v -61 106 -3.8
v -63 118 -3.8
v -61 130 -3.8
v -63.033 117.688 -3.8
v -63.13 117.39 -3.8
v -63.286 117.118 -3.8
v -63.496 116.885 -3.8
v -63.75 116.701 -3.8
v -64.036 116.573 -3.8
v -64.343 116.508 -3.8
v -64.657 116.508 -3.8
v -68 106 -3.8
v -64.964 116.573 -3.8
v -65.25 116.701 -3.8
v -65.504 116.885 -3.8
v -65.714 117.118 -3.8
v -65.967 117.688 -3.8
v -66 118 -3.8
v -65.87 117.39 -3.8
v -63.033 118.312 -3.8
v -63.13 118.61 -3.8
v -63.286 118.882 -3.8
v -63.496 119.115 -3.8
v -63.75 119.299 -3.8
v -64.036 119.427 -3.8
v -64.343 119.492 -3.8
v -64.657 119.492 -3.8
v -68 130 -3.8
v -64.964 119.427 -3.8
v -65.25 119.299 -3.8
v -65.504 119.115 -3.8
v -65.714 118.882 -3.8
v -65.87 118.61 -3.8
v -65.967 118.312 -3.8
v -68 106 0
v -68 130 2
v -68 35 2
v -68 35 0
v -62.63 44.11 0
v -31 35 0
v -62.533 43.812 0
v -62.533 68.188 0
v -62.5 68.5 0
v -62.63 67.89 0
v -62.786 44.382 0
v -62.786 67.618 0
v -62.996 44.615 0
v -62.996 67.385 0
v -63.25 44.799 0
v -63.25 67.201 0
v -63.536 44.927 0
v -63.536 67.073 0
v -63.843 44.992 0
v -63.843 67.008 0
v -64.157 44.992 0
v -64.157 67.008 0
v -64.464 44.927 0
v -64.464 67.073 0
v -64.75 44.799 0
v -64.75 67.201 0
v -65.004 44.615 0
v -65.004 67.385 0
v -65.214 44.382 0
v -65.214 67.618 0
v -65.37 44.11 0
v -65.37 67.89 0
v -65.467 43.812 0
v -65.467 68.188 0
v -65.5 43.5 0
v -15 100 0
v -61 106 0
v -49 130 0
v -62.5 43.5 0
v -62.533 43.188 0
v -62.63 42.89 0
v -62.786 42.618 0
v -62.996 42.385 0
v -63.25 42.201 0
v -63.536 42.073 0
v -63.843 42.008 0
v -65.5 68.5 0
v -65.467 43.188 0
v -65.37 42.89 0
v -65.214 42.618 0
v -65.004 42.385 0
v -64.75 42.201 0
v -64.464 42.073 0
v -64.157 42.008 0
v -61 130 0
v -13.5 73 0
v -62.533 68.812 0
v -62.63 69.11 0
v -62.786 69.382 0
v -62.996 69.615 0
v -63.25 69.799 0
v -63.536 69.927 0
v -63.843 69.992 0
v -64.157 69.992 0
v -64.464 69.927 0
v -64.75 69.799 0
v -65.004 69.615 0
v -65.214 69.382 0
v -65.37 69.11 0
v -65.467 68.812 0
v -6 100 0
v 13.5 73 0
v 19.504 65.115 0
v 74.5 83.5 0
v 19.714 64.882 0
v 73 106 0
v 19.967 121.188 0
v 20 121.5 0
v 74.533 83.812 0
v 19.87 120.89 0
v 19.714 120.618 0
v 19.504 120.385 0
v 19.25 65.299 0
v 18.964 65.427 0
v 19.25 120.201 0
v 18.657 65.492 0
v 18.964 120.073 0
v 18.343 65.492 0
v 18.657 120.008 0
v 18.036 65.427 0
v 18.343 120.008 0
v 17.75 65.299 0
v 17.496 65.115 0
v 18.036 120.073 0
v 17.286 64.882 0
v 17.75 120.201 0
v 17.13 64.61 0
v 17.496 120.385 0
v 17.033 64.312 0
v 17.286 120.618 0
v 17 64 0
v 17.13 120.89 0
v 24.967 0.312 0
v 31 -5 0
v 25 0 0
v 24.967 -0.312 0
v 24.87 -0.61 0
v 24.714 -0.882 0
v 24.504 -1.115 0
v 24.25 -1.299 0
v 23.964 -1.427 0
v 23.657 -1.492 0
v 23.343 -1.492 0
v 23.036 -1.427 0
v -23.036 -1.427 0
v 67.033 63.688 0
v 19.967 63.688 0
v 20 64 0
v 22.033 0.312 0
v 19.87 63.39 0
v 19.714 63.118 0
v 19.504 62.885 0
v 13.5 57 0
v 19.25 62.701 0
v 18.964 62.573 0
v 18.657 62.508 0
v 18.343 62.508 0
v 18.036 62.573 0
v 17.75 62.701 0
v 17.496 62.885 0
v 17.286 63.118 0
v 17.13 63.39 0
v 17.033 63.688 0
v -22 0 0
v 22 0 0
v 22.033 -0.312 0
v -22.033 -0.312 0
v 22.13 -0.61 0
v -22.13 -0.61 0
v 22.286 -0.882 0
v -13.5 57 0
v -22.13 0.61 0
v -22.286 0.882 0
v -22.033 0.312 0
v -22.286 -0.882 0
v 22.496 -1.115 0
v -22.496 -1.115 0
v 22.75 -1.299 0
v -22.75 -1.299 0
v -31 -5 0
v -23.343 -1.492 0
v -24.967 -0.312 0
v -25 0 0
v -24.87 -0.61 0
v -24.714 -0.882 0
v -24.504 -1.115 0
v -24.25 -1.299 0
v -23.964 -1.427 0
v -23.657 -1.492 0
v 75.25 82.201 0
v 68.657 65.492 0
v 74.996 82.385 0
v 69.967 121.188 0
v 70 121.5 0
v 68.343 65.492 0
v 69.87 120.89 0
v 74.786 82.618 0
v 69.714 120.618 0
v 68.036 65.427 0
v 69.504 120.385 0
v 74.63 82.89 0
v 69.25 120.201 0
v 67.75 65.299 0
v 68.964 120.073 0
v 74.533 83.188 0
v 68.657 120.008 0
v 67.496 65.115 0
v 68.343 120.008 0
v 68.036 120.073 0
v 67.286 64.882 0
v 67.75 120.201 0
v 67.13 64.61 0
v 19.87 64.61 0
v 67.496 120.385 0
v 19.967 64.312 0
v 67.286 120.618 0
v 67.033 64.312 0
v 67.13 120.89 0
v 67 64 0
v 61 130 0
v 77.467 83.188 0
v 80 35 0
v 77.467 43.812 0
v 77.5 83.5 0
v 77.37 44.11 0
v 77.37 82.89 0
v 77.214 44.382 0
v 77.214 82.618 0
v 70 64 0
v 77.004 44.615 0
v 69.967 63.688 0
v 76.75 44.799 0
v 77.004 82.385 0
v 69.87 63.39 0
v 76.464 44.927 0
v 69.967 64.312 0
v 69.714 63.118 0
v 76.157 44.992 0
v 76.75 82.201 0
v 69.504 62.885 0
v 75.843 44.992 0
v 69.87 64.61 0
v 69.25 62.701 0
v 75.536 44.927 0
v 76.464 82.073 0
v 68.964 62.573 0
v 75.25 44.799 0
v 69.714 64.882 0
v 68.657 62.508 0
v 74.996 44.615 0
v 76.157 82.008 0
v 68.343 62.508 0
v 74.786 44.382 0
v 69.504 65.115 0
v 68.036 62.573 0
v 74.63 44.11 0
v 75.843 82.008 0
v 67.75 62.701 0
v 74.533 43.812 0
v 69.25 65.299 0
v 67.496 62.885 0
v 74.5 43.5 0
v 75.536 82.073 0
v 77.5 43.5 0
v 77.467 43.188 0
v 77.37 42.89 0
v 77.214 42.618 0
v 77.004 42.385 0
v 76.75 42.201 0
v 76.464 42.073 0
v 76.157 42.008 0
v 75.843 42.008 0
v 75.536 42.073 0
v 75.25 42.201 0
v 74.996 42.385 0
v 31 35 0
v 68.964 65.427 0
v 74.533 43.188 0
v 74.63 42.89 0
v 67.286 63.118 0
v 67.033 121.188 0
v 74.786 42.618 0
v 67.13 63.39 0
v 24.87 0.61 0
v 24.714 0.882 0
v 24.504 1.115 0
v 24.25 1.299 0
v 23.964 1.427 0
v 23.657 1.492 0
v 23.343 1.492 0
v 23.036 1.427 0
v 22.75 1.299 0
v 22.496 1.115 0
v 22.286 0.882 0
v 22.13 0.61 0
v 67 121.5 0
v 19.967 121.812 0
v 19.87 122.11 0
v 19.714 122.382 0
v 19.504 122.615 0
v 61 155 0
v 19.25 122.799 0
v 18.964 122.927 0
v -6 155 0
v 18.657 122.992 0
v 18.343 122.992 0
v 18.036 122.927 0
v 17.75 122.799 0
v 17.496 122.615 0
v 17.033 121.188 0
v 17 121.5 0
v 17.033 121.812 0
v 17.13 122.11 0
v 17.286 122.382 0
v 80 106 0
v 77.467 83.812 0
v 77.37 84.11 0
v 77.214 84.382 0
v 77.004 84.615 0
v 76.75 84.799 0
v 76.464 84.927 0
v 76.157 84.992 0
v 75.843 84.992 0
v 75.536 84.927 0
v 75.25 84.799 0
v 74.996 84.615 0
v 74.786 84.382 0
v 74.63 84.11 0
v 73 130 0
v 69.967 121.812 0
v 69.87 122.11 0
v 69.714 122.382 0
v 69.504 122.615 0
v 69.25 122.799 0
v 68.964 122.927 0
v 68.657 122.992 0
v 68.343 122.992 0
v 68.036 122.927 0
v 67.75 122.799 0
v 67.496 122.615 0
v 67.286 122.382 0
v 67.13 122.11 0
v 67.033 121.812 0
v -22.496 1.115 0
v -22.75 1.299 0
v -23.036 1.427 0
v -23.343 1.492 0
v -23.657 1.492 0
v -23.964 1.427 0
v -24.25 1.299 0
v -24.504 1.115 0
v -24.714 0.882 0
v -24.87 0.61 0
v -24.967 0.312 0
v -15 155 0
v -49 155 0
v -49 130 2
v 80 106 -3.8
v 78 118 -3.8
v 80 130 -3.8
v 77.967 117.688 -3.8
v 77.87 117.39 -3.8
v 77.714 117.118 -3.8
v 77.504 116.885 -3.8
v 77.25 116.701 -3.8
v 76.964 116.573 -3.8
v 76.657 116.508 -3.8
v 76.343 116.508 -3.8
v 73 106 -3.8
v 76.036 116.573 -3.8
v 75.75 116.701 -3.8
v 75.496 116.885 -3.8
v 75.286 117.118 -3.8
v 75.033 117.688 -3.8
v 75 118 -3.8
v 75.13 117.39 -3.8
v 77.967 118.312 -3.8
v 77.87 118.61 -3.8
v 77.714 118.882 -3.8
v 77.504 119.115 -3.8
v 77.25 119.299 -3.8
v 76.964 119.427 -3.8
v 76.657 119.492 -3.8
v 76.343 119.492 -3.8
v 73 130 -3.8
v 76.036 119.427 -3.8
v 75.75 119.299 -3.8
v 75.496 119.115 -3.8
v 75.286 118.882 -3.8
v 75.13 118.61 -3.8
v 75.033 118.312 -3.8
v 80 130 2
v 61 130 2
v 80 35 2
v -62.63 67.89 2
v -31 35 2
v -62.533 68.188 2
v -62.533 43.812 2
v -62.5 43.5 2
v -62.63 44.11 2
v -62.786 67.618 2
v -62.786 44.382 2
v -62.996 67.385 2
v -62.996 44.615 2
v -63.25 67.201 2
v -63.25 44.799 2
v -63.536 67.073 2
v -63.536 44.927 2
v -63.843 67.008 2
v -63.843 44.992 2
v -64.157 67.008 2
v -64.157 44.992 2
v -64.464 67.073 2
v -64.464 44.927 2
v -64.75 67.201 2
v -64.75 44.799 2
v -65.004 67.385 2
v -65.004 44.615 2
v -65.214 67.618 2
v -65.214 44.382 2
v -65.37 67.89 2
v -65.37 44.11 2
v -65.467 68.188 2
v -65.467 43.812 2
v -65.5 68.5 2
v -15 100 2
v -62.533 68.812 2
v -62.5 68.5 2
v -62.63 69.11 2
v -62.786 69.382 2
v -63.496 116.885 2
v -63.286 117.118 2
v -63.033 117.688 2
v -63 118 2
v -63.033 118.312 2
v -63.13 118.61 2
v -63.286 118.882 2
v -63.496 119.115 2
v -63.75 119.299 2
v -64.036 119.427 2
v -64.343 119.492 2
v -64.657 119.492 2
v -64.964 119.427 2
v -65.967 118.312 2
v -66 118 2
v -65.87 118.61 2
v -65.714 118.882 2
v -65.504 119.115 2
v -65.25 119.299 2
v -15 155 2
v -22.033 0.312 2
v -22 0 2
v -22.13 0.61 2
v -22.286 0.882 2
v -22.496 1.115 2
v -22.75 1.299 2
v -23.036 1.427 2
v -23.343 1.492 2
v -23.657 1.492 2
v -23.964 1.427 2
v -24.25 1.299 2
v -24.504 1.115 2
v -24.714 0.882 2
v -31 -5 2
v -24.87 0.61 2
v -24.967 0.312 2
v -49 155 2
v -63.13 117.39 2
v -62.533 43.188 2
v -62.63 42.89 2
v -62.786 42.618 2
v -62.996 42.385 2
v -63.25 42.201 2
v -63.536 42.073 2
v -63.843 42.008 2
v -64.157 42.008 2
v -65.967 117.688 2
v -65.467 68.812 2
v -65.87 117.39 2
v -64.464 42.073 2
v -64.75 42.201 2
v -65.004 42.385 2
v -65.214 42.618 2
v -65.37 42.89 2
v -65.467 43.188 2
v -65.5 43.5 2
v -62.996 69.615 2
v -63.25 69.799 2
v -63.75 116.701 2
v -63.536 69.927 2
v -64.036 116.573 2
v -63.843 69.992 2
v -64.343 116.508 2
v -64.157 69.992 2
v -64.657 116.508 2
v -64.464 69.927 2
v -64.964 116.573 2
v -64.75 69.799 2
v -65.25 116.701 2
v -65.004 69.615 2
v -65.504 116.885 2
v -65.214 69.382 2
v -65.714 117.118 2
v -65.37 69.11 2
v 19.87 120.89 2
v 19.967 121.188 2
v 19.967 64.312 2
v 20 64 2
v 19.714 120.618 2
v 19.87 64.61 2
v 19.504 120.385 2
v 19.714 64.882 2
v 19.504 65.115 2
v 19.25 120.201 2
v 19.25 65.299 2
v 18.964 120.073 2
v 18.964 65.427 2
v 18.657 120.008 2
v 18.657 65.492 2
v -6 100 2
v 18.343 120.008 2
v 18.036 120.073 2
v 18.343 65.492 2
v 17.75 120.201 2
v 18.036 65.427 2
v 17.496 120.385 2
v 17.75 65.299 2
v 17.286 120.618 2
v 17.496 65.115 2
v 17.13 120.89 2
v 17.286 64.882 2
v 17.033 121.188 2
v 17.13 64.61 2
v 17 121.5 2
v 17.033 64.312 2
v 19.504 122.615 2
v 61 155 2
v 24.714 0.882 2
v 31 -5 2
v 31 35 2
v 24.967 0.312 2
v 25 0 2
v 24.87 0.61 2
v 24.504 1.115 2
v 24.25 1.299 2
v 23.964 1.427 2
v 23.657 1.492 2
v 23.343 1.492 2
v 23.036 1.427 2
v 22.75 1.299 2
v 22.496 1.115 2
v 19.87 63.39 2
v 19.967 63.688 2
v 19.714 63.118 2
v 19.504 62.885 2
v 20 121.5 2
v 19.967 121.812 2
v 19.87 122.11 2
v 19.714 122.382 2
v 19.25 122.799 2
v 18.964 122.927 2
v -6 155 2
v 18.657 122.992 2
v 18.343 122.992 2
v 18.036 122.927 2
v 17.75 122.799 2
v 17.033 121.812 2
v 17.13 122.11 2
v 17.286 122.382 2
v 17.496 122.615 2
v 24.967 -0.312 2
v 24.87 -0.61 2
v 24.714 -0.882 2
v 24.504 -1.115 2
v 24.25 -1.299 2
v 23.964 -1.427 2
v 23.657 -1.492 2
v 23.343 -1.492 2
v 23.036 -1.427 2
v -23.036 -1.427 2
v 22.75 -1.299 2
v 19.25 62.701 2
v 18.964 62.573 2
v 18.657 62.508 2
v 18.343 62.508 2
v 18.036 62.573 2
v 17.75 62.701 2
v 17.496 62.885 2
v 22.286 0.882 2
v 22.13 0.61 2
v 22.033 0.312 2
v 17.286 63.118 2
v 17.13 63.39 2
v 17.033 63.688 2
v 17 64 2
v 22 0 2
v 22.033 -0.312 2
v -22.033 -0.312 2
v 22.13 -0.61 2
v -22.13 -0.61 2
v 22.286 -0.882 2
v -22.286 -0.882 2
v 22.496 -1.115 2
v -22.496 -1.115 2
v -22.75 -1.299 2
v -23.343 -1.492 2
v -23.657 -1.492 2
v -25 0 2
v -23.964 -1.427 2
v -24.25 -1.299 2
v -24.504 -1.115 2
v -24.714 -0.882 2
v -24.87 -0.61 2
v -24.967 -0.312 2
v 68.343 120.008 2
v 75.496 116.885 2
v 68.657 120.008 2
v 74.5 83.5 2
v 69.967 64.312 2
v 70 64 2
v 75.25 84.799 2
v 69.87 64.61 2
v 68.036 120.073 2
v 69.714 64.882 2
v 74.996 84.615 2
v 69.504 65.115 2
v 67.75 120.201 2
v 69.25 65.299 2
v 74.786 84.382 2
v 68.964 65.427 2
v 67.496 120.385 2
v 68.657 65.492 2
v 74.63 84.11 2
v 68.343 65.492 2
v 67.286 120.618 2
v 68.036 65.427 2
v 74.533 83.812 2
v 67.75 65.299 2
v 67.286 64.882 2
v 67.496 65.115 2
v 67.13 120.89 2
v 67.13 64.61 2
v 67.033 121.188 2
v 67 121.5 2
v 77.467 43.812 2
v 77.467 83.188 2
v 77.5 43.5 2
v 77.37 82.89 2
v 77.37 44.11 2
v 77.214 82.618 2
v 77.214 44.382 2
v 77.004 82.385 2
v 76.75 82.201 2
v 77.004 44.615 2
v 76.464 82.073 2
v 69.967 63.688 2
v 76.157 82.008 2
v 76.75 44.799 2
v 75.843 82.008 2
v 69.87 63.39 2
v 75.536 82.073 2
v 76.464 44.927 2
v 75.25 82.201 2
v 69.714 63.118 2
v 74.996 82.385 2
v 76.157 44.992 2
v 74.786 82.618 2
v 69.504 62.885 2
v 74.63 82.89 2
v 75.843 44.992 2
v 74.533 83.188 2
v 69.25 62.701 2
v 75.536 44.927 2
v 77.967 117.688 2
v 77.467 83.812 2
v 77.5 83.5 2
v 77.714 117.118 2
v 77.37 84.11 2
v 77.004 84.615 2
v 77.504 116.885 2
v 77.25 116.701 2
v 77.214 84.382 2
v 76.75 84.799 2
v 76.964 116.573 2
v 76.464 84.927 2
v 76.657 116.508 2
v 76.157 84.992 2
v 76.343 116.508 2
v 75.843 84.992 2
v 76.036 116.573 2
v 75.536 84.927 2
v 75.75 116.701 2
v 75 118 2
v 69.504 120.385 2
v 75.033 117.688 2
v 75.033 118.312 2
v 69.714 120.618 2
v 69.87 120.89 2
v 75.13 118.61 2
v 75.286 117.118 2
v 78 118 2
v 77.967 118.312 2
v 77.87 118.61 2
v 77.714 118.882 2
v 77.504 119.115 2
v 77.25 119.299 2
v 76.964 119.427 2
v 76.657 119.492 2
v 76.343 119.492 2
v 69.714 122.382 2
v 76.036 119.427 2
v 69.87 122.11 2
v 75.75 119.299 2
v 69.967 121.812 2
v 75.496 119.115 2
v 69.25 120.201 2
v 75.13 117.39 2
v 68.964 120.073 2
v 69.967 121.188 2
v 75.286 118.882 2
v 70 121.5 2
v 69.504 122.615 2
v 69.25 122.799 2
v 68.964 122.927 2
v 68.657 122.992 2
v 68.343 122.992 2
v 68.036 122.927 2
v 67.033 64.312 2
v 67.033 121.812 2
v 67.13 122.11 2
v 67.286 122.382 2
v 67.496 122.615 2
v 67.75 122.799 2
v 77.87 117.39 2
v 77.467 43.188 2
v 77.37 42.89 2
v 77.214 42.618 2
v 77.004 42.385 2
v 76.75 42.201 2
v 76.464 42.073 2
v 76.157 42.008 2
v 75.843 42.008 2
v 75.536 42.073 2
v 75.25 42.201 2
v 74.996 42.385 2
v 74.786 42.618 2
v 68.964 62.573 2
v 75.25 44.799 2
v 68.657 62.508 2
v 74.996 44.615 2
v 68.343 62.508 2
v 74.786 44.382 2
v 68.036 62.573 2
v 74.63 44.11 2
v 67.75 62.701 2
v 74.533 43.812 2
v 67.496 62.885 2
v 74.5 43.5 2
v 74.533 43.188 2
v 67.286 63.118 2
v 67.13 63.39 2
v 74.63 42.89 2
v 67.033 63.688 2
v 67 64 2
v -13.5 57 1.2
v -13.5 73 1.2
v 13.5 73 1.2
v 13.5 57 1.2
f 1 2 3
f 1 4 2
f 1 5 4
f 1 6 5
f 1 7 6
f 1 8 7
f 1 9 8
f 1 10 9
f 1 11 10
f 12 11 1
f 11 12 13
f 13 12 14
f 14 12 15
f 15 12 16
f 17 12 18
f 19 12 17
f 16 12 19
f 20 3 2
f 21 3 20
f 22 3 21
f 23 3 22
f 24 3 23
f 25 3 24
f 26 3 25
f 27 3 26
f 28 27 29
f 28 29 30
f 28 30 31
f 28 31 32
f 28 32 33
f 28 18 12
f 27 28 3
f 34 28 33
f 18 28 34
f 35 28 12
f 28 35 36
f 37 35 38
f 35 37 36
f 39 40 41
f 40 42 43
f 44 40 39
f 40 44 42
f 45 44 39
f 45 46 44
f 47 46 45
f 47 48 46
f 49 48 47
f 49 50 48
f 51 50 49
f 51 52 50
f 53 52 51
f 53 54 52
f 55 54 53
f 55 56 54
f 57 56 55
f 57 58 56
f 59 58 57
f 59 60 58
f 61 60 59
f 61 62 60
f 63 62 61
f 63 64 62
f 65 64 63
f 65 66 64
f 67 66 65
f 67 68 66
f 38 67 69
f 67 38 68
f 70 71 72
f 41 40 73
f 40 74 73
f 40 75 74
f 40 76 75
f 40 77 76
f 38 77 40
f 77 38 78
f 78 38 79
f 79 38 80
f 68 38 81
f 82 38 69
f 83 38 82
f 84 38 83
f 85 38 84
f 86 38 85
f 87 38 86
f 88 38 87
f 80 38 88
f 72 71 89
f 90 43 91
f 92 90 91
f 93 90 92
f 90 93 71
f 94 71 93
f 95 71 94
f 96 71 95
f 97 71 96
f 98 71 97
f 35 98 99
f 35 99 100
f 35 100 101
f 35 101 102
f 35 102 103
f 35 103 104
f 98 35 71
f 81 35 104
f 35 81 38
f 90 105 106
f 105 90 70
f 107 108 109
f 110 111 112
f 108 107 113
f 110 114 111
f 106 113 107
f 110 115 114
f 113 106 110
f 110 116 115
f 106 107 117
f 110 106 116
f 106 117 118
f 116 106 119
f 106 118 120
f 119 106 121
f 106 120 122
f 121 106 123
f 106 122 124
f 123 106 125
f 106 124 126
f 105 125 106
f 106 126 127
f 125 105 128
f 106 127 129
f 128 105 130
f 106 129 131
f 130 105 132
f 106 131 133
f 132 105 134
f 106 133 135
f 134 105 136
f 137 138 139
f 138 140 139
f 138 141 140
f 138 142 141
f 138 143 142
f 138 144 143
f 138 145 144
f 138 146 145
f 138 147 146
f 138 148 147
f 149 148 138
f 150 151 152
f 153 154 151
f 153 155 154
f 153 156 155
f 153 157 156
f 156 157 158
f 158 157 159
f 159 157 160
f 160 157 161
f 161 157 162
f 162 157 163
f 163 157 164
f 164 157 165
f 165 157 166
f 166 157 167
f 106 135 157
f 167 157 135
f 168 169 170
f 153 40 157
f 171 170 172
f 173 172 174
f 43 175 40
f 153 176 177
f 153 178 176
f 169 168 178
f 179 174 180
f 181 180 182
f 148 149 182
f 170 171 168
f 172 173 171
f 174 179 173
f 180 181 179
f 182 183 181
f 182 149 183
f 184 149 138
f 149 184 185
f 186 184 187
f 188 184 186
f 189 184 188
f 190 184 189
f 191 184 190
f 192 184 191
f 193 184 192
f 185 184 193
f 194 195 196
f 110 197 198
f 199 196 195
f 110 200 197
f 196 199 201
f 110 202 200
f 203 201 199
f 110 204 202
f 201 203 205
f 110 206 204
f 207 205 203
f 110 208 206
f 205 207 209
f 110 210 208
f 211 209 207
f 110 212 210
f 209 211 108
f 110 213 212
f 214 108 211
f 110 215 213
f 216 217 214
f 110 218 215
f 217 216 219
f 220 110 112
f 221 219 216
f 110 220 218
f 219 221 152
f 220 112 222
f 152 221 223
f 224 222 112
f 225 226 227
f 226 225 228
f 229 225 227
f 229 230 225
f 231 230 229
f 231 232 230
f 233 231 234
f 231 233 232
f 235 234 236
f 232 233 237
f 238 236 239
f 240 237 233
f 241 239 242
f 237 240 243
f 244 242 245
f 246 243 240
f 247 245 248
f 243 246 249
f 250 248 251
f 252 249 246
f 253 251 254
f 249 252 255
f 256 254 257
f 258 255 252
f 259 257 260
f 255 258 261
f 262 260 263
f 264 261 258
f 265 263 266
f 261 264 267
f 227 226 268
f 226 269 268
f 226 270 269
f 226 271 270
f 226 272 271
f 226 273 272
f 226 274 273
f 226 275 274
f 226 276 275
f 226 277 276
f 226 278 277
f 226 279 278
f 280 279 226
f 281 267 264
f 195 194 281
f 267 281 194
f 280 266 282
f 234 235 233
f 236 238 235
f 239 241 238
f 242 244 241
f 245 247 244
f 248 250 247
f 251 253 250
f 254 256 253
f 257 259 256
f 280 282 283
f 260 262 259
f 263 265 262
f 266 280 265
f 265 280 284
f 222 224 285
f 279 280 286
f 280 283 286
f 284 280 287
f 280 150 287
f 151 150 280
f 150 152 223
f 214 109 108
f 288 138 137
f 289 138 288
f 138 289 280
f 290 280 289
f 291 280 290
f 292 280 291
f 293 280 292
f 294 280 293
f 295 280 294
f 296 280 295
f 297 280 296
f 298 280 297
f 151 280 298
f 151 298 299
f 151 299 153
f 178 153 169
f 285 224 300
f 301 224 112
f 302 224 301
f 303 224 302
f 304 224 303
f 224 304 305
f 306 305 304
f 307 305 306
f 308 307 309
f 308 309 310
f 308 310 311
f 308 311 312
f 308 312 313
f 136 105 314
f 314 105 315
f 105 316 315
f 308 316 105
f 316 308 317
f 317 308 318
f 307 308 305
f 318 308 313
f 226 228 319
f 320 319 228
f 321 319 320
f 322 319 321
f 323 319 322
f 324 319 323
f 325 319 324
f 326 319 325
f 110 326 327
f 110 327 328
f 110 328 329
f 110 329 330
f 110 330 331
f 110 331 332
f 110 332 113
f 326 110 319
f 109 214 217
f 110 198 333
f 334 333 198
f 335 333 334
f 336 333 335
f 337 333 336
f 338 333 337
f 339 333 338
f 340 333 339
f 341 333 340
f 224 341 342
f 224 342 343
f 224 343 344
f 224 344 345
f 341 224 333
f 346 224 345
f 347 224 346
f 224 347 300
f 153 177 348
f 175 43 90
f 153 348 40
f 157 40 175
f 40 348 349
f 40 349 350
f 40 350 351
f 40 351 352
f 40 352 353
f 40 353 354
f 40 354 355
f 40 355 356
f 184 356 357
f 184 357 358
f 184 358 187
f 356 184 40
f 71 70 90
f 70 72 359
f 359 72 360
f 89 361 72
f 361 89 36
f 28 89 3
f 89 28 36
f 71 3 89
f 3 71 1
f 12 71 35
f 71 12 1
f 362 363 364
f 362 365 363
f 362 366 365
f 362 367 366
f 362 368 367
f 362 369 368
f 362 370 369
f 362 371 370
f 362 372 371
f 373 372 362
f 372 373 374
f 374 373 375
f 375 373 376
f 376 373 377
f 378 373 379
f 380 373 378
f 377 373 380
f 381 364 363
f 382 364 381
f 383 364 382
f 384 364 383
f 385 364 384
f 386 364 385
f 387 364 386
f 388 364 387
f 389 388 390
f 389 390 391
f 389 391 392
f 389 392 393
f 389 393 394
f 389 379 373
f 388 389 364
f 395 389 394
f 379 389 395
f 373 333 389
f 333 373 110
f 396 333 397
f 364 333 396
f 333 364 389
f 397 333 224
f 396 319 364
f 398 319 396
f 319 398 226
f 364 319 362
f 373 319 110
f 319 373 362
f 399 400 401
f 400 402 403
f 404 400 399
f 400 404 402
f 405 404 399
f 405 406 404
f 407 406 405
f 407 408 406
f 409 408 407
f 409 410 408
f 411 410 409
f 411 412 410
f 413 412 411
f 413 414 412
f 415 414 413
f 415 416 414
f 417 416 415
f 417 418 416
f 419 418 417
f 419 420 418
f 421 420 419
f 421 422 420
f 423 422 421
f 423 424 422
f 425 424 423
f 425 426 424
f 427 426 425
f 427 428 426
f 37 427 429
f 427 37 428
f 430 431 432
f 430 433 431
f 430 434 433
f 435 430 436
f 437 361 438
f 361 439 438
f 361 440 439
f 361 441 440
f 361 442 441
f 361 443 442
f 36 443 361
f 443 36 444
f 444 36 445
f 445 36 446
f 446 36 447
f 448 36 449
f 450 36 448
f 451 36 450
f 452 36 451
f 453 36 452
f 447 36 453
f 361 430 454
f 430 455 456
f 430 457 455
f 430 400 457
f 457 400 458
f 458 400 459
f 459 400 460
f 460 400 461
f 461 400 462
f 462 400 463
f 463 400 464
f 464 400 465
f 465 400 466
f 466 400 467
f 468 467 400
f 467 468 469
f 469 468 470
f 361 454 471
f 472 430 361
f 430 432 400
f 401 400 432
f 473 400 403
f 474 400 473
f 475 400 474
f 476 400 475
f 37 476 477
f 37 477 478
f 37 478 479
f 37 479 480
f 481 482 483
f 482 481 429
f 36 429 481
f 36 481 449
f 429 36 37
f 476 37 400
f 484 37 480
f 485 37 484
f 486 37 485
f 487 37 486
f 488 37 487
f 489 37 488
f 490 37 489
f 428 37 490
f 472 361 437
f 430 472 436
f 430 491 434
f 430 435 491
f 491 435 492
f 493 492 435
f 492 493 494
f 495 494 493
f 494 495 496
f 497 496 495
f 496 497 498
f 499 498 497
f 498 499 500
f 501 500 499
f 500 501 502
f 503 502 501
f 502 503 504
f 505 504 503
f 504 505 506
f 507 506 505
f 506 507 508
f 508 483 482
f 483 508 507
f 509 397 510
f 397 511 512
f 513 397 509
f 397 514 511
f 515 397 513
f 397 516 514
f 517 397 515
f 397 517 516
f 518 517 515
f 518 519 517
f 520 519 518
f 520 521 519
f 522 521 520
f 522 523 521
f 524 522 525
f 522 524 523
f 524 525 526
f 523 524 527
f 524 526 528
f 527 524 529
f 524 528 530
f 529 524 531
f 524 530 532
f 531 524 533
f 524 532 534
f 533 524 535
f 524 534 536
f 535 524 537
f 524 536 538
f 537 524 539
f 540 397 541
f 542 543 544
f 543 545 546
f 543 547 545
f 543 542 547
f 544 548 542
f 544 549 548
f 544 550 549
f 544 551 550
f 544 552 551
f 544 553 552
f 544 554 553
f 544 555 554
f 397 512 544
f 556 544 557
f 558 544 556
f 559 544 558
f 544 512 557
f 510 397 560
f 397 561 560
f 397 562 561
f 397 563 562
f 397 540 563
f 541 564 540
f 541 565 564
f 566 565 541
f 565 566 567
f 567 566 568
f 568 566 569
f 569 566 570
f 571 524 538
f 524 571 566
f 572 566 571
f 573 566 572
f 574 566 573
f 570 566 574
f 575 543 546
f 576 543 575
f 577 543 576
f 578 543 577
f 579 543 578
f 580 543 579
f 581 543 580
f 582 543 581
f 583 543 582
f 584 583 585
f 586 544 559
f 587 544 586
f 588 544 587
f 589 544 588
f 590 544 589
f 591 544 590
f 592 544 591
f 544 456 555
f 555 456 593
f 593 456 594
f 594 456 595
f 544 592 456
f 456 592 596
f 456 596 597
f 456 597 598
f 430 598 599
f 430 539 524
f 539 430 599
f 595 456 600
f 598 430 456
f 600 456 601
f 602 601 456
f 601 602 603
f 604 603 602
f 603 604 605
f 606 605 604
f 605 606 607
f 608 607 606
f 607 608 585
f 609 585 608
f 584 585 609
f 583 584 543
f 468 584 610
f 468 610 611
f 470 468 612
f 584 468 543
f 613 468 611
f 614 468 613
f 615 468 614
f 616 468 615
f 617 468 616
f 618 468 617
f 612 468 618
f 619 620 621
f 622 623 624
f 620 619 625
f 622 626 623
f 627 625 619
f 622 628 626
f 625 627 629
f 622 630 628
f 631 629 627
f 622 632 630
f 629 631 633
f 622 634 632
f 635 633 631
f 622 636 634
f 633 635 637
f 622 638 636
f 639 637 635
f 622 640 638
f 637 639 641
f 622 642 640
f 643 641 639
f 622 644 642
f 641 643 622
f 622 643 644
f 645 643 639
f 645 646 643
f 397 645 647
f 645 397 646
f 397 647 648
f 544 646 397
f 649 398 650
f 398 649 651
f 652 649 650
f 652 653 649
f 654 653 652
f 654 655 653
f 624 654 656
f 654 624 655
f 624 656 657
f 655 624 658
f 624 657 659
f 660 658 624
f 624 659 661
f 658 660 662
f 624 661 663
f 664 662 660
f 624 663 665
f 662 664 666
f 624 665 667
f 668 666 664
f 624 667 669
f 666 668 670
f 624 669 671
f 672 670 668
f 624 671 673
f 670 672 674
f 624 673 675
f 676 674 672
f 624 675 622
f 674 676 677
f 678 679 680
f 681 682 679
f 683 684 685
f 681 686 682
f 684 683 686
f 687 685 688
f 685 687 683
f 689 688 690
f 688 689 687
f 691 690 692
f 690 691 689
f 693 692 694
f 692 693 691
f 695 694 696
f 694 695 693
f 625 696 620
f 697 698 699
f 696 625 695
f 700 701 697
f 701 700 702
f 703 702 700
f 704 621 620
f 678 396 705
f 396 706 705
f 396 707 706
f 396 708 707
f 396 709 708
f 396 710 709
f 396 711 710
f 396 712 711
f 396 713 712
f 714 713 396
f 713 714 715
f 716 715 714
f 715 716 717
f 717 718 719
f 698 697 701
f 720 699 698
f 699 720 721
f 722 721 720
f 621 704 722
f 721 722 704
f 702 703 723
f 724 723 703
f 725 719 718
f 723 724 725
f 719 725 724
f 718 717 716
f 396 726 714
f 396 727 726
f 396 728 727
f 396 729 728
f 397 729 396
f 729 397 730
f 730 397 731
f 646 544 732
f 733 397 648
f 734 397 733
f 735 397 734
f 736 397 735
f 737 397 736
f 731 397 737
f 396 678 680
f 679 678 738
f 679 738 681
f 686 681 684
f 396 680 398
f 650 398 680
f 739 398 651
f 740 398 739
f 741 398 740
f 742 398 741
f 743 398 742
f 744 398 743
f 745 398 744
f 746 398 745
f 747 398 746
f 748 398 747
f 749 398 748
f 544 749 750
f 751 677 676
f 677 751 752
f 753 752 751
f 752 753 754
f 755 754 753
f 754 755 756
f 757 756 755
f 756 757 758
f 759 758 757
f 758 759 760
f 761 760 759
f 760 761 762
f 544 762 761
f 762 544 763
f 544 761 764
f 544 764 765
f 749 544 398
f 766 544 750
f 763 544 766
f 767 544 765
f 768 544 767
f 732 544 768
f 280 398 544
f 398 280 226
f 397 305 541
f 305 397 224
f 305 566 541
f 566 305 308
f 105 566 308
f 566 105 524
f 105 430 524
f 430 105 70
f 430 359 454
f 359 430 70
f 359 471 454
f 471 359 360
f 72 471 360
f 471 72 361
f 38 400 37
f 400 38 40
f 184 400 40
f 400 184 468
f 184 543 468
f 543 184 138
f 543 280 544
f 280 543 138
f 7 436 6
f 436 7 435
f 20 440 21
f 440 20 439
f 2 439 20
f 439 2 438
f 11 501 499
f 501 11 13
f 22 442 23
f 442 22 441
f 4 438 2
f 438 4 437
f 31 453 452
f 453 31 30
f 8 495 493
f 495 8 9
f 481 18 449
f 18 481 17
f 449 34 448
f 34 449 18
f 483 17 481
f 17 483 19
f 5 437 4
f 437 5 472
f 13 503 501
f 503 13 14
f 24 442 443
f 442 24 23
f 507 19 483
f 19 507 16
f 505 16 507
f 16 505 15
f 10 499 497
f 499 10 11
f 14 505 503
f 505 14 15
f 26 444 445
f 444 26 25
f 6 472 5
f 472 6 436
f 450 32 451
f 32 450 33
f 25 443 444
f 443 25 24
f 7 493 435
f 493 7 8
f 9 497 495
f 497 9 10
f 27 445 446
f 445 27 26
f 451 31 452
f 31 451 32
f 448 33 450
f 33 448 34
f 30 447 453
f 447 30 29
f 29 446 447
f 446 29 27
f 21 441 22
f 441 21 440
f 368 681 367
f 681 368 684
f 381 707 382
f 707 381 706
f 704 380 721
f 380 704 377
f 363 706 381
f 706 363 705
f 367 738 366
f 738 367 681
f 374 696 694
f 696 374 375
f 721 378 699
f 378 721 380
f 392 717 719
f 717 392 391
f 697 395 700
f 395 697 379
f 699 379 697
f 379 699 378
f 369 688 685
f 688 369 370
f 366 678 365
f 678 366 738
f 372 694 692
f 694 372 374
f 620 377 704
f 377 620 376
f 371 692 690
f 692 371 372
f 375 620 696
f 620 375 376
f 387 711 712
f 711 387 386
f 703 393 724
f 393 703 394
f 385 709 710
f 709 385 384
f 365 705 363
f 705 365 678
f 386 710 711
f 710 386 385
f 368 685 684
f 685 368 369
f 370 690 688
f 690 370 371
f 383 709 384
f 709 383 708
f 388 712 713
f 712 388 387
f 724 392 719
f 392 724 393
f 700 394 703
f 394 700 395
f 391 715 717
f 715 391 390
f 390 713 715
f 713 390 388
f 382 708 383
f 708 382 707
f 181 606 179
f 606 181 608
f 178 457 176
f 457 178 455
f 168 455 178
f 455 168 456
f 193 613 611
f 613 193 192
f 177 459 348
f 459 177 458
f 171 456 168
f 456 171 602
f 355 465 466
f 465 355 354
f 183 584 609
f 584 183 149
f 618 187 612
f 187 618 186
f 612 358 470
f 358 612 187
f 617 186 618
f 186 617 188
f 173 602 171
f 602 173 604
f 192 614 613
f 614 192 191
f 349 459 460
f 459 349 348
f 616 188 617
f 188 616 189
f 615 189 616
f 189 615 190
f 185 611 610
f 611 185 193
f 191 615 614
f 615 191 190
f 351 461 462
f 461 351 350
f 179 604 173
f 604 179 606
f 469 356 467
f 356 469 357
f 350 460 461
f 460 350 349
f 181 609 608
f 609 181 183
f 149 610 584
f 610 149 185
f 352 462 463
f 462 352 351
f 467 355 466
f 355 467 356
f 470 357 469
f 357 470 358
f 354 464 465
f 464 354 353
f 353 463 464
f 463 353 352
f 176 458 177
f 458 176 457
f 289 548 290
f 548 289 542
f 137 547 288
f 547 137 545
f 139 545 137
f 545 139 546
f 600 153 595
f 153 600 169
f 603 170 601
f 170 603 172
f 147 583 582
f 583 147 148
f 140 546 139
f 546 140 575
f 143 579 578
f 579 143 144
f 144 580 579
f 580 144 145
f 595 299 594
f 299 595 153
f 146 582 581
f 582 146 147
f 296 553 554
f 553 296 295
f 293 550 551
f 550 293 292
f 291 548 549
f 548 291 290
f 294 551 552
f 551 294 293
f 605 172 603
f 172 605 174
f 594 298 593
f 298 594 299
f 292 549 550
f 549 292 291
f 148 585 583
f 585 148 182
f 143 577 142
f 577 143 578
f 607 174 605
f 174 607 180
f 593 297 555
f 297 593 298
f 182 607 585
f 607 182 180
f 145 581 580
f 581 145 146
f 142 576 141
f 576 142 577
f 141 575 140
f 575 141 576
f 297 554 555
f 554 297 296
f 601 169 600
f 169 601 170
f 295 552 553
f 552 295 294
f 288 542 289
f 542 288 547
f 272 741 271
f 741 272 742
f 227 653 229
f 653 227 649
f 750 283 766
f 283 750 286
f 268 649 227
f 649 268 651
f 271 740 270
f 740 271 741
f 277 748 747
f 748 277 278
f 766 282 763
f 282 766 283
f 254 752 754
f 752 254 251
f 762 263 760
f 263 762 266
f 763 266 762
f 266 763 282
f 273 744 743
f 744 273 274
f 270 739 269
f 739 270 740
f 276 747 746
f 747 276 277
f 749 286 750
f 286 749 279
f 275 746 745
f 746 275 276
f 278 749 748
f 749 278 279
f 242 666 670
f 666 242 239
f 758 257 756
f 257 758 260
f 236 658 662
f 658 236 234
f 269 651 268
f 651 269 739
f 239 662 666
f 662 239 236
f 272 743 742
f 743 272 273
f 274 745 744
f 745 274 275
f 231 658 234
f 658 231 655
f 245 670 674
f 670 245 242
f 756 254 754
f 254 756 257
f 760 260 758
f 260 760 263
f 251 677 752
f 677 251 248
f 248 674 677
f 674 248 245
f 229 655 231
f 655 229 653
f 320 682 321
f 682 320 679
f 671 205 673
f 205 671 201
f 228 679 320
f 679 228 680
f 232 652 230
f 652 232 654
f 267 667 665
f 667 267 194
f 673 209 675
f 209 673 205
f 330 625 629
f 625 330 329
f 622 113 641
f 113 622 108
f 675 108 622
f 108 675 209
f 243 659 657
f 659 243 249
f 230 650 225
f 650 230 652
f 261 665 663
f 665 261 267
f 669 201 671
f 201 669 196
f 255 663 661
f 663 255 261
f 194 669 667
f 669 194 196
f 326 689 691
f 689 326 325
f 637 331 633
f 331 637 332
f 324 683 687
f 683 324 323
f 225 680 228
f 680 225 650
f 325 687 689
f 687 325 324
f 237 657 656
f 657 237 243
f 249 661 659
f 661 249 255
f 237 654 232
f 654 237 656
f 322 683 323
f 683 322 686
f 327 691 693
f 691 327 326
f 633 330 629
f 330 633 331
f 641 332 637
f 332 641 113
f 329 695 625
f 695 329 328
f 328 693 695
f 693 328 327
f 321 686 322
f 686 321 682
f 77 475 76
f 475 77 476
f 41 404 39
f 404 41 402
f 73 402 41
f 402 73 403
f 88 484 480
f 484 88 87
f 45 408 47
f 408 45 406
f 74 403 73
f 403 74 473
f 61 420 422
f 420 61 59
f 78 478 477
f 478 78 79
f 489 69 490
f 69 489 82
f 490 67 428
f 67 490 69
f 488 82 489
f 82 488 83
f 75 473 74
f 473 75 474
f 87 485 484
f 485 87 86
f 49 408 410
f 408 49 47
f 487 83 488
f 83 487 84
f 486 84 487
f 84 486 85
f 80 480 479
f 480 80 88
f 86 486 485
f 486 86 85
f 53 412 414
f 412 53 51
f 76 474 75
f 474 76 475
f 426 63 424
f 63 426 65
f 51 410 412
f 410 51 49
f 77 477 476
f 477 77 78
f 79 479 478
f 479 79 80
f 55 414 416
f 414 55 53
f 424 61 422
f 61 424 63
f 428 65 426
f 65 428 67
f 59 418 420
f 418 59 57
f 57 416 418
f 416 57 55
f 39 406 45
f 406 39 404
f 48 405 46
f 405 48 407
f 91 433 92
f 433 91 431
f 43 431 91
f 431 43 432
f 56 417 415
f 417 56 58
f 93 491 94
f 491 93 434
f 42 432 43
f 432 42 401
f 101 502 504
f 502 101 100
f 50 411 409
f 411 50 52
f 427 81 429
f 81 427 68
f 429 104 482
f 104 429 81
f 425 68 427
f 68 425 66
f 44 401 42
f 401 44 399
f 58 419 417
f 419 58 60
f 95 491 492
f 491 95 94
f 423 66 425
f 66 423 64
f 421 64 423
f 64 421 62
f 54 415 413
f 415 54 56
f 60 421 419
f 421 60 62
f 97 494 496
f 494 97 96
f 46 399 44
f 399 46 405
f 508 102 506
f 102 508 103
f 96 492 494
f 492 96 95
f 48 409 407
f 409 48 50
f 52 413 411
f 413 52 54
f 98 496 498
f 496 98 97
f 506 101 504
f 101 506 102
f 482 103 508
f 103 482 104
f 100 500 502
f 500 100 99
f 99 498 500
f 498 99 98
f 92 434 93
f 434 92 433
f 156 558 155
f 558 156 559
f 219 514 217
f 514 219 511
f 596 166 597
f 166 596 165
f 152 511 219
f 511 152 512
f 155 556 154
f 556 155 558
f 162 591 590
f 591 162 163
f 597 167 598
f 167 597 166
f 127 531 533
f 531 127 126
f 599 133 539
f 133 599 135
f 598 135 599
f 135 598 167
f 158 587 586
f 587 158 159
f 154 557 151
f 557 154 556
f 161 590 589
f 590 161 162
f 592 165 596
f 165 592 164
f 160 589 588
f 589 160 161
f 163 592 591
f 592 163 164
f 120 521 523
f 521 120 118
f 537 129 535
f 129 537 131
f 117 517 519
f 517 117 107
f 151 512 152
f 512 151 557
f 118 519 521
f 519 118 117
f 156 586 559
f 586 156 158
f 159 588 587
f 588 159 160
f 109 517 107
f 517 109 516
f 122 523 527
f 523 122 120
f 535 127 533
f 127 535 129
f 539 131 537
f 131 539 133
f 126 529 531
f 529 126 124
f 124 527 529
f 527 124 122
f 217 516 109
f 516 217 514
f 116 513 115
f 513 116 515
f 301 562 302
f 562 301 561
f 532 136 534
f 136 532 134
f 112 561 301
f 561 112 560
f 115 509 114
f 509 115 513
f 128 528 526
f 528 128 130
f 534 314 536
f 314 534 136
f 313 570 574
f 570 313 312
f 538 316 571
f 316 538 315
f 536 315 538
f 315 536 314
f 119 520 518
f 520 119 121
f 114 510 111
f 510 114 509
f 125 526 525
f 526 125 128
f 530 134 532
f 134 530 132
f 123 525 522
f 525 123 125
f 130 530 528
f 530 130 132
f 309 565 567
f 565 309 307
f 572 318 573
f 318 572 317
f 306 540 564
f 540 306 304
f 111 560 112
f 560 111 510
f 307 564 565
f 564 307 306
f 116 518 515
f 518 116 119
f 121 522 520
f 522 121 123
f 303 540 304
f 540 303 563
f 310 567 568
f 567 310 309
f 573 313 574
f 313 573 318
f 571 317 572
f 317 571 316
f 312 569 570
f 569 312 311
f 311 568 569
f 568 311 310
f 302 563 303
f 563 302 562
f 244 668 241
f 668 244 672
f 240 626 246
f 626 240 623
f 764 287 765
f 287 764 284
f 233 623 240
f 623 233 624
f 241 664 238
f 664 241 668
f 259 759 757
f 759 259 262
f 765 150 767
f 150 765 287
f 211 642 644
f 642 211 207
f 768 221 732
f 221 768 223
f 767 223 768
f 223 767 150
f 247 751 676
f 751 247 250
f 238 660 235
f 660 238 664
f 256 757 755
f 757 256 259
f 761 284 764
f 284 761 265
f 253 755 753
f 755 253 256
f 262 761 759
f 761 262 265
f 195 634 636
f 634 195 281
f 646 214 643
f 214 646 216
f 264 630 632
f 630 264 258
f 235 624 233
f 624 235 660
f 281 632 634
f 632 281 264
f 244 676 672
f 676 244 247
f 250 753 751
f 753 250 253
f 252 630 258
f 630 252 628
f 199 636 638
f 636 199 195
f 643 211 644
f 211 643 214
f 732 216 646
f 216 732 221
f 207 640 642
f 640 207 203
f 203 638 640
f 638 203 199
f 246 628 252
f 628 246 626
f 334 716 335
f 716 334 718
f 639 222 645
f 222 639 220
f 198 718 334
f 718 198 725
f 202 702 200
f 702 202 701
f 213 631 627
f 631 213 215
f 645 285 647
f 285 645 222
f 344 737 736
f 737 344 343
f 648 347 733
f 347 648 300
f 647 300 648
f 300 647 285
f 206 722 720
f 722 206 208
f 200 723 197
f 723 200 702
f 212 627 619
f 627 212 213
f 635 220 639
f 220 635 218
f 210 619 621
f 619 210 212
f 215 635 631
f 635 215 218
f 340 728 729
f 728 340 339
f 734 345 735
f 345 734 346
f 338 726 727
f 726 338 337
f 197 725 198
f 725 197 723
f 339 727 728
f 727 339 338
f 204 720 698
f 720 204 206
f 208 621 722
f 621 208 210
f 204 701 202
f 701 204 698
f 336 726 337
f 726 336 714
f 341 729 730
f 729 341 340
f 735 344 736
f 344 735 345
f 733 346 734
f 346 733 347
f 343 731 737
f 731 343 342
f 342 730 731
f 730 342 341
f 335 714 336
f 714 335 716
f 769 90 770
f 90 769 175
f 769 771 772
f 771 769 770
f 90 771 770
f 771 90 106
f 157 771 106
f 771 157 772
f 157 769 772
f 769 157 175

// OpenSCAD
mounting_holes = [

    // holes in back
    [-47/2, 0],
    [47/2, 0],
    
    // left side holes (from back to front)
    [80-4, 35+8.5],
    [80-4, 35+8.5+40],
    
    // right side holes (from back to front)
    [-68+4, 35+8.5],
    [-68+4, 35+8.5+25],
    
    // esc holes
    [13.5+5, 35+29],
    [13.5+5, 35+29+57.5],
    [13.5+5+50, 35+29],
    [13.5+5+50, 35+29+57.5],

];

points = [
    [0,-5],
    [62/2,-5],
    [62/2,35],
    [80, 35],
    [80, 35+95],
    [80-19, 35+95],
    [80-19, 35+120],
        
    // motor wire cutout
    [-6, 35+120],
    [-6, 100],
    [-6-9, 100],
    [-6-9, 35+120],
    
    [-68+19, 35+120],
    [-68+19, 35+95],
    [-68, 35+95],

    [-68, 35],
    [-62/2,35],
    [-62/2,-5],
];


difference() {
    union() {
        linear_extrude(2) polygon(points);
        for (delta=[-68+7/2, 80-7/2]) translate([delta, 88+30, -3.8]) linear_extrude(3.8) square([7, 24], center=true);
    }
    
    for (delta=[-68+7/2, 80-7/2]) translate([delta, 88+30, -3.8]) linear_extrude(10) circle(d=3, $fn=30);
    for (hole=mounting_holes) translate(hole) linear_extrude(10) circle(d=3, $fn=30);
    
    // gearbox cutout
    translate([0,57+16/2]) linear_extrude(1.2)  square([27,16],center=true);
}

    
